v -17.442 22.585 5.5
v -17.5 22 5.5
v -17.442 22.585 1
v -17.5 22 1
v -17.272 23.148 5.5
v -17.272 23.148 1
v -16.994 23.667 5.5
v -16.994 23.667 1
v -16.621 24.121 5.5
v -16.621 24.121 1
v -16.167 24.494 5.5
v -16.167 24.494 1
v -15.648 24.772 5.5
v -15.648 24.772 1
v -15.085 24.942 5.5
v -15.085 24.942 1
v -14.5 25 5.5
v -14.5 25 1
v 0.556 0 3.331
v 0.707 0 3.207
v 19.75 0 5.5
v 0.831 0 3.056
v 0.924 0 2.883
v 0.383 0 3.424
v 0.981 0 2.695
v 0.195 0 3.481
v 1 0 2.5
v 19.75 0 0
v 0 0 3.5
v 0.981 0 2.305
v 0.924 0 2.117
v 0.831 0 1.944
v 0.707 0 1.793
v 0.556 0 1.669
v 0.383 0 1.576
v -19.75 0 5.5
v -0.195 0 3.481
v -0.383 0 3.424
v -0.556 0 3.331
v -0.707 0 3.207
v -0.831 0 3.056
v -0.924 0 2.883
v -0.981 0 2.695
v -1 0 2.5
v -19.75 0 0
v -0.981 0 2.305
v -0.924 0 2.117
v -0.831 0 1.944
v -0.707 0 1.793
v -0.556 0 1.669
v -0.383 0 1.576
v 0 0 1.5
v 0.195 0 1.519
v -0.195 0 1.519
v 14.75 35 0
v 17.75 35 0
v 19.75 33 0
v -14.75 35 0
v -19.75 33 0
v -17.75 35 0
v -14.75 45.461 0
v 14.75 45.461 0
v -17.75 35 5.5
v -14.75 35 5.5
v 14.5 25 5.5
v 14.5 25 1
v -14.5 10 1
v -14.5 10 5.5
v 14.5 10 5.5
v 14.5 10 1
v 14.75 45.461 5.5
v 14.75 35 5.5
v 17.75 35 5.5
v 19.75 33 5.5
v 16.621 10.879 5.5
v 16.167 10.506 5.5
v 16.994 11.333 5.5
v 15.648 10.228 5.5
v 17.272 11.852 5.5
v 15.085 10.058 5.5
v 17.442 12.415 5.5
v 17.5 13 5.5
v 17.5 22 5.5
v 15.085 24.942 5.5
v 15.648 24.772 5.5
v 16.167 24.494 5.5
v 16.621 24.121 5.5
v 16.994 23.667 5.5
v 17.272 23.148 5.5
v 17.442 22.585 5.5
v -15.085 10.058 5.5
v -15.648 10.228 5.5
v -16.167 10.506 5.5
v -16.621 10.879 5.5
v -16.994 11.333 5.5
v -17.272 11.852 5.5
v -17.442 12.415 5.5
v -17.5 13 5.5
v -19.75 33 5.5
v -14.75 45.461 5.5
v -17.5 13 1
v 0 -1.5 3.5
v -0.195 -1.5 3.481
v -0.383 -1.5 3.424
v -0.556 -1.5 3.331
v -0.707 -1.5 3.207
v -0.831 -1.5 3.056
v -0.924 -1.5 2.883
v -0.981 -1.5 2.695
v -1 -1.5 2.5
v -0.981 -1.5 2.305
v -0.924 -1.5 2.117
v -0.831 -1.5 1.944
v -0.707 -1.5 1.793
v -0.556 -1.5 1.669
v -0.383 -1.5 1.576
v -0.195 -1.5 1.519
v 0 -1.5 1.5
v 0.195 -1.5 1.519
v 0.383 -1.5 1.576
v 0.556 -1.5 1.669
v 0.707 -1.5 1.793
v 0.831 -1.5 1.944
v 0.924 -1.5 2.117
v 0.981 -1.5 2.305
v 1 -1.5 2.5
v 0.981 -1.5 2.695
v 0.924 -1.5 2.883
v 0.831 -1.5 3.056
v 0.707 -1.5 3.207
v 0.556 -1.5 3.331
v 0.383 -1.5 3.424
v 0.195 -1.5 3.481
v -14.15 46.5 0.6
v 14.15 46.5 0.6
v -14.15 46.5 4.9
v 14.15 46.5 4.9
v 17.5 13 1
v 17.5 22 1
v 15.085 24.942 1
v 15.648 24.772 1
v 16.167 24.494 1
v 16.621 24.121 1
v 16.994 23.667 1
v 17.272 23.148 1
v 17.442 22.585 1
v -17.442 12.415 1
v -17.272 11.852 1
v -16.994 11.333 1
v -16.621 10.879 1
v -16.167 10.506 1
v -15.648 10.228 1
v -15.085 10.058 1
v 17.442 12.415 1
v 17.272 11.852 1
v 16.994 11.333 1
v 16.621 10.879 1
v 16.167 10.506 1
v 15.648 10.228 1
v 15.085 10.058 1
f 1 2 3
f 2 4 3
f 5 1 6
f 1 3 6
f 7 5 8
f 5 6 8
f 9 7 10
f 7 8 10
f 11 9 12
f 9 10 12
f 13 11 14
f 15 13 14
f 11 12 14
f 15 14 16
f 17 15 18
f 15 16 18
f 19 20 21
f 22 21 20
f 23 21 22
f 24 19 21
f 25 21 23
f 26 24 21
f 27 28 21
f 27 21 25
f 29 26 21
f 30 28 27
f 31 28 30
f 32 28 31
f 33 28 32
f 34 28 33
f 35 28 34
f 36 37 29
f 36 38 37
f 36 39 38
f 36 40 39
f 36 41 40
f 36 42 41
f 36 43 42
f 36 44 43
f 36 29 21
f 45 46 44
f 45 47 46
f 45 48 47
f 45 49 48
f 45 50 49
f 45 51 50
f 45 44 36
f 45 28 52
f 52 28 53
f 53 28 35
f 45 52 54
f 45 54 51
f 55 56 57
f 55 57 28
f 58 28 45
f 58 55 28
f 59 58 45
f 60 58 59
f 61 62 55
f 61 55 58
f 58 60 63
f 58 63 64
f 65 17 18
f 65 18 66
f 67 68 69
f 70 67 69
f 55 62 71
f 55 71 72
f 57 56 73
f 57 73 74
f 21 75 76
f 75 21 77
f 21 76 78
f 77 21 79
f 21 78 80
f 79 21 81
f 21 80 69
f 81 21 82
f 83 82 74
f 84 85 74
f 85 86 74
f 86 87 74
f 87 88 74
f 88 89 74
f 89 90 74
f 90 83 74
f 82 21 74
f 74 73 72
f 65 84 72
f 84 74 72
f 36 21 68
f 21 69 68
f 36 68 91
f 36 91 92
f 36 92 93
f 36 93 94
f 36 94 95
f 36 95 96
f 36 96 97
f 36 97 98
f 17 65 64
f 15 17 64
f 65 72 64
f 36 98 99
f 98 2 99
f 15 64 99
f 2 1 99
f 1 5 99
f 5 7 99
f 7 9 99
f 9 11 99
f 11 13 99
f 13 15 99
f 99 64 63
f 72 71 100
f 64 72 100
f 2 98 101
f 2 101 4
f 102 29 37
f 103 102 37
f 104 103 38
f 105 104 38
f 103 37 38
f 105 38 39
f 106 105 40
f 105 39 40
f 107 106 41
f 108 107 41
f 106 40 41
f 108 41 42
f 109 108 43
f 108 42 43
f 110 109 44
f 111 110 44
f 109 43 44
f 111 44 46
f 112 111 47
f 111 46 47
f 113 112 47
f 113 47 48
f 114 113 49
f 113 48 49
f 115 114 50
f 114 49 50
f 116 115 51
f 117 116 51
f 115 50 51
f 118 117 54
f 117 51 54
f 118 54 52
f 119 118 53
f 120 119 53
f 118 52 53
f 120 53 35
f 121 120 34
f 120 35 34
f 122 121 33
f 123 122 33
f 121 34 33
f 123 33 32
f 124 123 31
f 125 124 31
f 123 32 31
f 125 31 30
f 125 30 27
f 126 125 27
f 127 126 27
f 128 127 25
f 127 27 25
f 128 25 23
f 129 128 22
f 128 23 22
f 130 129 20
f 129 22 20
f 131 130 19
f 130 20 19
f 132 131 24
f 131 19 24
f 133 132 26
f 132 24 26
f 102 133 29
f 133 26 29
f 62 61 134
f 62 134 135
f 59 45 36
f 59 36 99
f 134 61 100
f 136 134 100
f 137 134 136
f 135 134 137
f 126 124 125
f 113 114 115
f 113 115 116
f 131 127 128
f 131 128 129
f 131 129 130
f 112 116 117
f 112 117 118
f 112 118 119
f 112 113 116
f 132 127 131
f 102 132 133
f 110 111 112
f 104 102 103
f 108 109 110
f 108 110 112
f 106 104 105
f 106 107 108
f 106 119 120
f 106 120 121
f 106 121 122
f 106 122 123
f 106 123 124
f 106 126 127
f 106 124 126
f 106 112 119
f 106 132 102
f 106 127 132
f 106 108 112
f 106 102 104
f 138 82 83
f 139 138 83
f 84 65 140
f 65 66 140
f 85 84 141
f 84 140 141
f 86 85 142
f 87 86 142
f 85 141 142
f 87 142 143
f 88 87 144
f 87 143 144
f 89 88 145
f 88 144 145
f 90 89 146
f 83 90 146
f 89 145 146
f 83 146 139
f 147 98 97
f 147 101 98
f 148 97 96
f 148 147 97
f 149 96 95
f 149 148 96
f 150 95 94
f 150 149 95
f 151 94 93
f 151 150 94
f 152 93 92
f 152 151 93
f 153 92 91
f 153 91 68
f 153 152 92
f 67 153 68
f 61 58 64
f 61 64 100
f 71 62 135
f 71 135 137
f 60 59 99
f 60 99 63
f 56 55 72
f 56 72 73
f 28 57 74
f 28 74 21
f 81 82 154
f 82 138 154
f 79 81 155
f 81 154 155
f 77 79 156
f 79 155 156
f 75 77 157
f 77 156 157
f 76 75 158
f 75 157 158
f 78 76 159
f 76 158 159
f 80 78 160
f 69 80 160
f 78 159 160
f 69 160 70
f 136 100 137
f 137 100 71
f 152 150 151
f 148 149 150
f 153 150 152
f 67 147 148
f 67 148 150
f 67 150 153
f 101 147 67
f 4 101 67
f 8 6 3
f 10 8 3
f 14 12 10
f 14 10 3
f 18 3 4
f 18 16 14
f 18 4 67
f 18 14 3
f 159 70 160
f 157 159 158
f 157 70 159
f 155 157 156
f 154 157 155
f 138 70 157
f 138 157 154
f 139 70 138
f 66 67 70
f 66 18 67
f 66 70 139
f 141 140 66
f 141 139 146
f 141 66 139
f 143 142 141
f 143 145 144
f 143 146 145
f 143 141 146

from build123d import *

# Parameters (mm, degrees)
EXTRUDE_1_DEPTH     = 5.5
CHAMFER_1_SIZE      = 0.6
CHAMFER_1_SIZE2     = 1.039230485
SKETCH_2_W          = 35
SKETCH_2_H          = 15
CUT_EXTRUDE_1_DEPTH = 4.5
FILLET_1_R          = 3
SKETCH_3_R          = 1
EXTRUDE_2_DEPTH     = 1.5


with BuildPart() as part:
    # Эскиз1 → Бобышка-Вытянуть1 (new body)
    with BuildSketch(Plane.XY):
        Polygon((19.75, 0), (-19.75, 0), (-19.75, 33), (-17.75, 35), (-14.75, 35), (-14.75, 46.5), (14.75, 46.5), (14.75, 35), (17.75, 35), (19.75, 33), align=None)
    extrude(amount=EXTRUDE_1_DEPTH)

    # Фаска1
    chamfer_1_edges = [part.edges().sort_by_distance(p)[0] for p in [
        (0, 46.5, 0),
        (-14.75, 46.5, 2.75),
        (14.75, 46.5, 2.75),
        (0, 46.5, 5.5),
    ]]
    chamfer_1_side = [part.faces().sort_by_distance(p)[0] for p in [
        (0, 46.5, 2.75),
    ]]
    chamfer(chamfer_1_edges, length=CHAMFER_1_SIZE, length2=CHAMFER_1_SIZE2, reference=chamfer_1_side[0])

    # Эскиз2 → Вырез-Вытянуть1 (cut)
    with BuildSketch(Plane.XY.offset(5.5)):
        with Locations((0, 17.5)):
            Rectangle(SKETCH_2_W, SKETCH_2_H)
    extrude(amount=-CUT_EXTRUDE_1_DEPTH, mode=Mode.SUBTRACT)

    # Скругление1
    fillet_1_edges = [part.edges().sort_by_distance(p)[0] for p in [
        (17.5, 10, 3.25),
        (17.5, 25, 3.25),
        (-17.5, 25, 3.25),
        (-17.5, 10, 3.25),
    ]]
    fillet(fillet_1_edges, radius=FILLET_1_R)

    # Эскиз3 → Бобышка-Вытянуть2 (add)
    with BuildSketch(Plane.XZ):
        with Locations(Location((0, 2.5, 0), (0, 0, 90))):
            Circle(SKETCH_3_R)
    extrude(amount=EXTRUDE_2_DEPTH)


solid = part.part
